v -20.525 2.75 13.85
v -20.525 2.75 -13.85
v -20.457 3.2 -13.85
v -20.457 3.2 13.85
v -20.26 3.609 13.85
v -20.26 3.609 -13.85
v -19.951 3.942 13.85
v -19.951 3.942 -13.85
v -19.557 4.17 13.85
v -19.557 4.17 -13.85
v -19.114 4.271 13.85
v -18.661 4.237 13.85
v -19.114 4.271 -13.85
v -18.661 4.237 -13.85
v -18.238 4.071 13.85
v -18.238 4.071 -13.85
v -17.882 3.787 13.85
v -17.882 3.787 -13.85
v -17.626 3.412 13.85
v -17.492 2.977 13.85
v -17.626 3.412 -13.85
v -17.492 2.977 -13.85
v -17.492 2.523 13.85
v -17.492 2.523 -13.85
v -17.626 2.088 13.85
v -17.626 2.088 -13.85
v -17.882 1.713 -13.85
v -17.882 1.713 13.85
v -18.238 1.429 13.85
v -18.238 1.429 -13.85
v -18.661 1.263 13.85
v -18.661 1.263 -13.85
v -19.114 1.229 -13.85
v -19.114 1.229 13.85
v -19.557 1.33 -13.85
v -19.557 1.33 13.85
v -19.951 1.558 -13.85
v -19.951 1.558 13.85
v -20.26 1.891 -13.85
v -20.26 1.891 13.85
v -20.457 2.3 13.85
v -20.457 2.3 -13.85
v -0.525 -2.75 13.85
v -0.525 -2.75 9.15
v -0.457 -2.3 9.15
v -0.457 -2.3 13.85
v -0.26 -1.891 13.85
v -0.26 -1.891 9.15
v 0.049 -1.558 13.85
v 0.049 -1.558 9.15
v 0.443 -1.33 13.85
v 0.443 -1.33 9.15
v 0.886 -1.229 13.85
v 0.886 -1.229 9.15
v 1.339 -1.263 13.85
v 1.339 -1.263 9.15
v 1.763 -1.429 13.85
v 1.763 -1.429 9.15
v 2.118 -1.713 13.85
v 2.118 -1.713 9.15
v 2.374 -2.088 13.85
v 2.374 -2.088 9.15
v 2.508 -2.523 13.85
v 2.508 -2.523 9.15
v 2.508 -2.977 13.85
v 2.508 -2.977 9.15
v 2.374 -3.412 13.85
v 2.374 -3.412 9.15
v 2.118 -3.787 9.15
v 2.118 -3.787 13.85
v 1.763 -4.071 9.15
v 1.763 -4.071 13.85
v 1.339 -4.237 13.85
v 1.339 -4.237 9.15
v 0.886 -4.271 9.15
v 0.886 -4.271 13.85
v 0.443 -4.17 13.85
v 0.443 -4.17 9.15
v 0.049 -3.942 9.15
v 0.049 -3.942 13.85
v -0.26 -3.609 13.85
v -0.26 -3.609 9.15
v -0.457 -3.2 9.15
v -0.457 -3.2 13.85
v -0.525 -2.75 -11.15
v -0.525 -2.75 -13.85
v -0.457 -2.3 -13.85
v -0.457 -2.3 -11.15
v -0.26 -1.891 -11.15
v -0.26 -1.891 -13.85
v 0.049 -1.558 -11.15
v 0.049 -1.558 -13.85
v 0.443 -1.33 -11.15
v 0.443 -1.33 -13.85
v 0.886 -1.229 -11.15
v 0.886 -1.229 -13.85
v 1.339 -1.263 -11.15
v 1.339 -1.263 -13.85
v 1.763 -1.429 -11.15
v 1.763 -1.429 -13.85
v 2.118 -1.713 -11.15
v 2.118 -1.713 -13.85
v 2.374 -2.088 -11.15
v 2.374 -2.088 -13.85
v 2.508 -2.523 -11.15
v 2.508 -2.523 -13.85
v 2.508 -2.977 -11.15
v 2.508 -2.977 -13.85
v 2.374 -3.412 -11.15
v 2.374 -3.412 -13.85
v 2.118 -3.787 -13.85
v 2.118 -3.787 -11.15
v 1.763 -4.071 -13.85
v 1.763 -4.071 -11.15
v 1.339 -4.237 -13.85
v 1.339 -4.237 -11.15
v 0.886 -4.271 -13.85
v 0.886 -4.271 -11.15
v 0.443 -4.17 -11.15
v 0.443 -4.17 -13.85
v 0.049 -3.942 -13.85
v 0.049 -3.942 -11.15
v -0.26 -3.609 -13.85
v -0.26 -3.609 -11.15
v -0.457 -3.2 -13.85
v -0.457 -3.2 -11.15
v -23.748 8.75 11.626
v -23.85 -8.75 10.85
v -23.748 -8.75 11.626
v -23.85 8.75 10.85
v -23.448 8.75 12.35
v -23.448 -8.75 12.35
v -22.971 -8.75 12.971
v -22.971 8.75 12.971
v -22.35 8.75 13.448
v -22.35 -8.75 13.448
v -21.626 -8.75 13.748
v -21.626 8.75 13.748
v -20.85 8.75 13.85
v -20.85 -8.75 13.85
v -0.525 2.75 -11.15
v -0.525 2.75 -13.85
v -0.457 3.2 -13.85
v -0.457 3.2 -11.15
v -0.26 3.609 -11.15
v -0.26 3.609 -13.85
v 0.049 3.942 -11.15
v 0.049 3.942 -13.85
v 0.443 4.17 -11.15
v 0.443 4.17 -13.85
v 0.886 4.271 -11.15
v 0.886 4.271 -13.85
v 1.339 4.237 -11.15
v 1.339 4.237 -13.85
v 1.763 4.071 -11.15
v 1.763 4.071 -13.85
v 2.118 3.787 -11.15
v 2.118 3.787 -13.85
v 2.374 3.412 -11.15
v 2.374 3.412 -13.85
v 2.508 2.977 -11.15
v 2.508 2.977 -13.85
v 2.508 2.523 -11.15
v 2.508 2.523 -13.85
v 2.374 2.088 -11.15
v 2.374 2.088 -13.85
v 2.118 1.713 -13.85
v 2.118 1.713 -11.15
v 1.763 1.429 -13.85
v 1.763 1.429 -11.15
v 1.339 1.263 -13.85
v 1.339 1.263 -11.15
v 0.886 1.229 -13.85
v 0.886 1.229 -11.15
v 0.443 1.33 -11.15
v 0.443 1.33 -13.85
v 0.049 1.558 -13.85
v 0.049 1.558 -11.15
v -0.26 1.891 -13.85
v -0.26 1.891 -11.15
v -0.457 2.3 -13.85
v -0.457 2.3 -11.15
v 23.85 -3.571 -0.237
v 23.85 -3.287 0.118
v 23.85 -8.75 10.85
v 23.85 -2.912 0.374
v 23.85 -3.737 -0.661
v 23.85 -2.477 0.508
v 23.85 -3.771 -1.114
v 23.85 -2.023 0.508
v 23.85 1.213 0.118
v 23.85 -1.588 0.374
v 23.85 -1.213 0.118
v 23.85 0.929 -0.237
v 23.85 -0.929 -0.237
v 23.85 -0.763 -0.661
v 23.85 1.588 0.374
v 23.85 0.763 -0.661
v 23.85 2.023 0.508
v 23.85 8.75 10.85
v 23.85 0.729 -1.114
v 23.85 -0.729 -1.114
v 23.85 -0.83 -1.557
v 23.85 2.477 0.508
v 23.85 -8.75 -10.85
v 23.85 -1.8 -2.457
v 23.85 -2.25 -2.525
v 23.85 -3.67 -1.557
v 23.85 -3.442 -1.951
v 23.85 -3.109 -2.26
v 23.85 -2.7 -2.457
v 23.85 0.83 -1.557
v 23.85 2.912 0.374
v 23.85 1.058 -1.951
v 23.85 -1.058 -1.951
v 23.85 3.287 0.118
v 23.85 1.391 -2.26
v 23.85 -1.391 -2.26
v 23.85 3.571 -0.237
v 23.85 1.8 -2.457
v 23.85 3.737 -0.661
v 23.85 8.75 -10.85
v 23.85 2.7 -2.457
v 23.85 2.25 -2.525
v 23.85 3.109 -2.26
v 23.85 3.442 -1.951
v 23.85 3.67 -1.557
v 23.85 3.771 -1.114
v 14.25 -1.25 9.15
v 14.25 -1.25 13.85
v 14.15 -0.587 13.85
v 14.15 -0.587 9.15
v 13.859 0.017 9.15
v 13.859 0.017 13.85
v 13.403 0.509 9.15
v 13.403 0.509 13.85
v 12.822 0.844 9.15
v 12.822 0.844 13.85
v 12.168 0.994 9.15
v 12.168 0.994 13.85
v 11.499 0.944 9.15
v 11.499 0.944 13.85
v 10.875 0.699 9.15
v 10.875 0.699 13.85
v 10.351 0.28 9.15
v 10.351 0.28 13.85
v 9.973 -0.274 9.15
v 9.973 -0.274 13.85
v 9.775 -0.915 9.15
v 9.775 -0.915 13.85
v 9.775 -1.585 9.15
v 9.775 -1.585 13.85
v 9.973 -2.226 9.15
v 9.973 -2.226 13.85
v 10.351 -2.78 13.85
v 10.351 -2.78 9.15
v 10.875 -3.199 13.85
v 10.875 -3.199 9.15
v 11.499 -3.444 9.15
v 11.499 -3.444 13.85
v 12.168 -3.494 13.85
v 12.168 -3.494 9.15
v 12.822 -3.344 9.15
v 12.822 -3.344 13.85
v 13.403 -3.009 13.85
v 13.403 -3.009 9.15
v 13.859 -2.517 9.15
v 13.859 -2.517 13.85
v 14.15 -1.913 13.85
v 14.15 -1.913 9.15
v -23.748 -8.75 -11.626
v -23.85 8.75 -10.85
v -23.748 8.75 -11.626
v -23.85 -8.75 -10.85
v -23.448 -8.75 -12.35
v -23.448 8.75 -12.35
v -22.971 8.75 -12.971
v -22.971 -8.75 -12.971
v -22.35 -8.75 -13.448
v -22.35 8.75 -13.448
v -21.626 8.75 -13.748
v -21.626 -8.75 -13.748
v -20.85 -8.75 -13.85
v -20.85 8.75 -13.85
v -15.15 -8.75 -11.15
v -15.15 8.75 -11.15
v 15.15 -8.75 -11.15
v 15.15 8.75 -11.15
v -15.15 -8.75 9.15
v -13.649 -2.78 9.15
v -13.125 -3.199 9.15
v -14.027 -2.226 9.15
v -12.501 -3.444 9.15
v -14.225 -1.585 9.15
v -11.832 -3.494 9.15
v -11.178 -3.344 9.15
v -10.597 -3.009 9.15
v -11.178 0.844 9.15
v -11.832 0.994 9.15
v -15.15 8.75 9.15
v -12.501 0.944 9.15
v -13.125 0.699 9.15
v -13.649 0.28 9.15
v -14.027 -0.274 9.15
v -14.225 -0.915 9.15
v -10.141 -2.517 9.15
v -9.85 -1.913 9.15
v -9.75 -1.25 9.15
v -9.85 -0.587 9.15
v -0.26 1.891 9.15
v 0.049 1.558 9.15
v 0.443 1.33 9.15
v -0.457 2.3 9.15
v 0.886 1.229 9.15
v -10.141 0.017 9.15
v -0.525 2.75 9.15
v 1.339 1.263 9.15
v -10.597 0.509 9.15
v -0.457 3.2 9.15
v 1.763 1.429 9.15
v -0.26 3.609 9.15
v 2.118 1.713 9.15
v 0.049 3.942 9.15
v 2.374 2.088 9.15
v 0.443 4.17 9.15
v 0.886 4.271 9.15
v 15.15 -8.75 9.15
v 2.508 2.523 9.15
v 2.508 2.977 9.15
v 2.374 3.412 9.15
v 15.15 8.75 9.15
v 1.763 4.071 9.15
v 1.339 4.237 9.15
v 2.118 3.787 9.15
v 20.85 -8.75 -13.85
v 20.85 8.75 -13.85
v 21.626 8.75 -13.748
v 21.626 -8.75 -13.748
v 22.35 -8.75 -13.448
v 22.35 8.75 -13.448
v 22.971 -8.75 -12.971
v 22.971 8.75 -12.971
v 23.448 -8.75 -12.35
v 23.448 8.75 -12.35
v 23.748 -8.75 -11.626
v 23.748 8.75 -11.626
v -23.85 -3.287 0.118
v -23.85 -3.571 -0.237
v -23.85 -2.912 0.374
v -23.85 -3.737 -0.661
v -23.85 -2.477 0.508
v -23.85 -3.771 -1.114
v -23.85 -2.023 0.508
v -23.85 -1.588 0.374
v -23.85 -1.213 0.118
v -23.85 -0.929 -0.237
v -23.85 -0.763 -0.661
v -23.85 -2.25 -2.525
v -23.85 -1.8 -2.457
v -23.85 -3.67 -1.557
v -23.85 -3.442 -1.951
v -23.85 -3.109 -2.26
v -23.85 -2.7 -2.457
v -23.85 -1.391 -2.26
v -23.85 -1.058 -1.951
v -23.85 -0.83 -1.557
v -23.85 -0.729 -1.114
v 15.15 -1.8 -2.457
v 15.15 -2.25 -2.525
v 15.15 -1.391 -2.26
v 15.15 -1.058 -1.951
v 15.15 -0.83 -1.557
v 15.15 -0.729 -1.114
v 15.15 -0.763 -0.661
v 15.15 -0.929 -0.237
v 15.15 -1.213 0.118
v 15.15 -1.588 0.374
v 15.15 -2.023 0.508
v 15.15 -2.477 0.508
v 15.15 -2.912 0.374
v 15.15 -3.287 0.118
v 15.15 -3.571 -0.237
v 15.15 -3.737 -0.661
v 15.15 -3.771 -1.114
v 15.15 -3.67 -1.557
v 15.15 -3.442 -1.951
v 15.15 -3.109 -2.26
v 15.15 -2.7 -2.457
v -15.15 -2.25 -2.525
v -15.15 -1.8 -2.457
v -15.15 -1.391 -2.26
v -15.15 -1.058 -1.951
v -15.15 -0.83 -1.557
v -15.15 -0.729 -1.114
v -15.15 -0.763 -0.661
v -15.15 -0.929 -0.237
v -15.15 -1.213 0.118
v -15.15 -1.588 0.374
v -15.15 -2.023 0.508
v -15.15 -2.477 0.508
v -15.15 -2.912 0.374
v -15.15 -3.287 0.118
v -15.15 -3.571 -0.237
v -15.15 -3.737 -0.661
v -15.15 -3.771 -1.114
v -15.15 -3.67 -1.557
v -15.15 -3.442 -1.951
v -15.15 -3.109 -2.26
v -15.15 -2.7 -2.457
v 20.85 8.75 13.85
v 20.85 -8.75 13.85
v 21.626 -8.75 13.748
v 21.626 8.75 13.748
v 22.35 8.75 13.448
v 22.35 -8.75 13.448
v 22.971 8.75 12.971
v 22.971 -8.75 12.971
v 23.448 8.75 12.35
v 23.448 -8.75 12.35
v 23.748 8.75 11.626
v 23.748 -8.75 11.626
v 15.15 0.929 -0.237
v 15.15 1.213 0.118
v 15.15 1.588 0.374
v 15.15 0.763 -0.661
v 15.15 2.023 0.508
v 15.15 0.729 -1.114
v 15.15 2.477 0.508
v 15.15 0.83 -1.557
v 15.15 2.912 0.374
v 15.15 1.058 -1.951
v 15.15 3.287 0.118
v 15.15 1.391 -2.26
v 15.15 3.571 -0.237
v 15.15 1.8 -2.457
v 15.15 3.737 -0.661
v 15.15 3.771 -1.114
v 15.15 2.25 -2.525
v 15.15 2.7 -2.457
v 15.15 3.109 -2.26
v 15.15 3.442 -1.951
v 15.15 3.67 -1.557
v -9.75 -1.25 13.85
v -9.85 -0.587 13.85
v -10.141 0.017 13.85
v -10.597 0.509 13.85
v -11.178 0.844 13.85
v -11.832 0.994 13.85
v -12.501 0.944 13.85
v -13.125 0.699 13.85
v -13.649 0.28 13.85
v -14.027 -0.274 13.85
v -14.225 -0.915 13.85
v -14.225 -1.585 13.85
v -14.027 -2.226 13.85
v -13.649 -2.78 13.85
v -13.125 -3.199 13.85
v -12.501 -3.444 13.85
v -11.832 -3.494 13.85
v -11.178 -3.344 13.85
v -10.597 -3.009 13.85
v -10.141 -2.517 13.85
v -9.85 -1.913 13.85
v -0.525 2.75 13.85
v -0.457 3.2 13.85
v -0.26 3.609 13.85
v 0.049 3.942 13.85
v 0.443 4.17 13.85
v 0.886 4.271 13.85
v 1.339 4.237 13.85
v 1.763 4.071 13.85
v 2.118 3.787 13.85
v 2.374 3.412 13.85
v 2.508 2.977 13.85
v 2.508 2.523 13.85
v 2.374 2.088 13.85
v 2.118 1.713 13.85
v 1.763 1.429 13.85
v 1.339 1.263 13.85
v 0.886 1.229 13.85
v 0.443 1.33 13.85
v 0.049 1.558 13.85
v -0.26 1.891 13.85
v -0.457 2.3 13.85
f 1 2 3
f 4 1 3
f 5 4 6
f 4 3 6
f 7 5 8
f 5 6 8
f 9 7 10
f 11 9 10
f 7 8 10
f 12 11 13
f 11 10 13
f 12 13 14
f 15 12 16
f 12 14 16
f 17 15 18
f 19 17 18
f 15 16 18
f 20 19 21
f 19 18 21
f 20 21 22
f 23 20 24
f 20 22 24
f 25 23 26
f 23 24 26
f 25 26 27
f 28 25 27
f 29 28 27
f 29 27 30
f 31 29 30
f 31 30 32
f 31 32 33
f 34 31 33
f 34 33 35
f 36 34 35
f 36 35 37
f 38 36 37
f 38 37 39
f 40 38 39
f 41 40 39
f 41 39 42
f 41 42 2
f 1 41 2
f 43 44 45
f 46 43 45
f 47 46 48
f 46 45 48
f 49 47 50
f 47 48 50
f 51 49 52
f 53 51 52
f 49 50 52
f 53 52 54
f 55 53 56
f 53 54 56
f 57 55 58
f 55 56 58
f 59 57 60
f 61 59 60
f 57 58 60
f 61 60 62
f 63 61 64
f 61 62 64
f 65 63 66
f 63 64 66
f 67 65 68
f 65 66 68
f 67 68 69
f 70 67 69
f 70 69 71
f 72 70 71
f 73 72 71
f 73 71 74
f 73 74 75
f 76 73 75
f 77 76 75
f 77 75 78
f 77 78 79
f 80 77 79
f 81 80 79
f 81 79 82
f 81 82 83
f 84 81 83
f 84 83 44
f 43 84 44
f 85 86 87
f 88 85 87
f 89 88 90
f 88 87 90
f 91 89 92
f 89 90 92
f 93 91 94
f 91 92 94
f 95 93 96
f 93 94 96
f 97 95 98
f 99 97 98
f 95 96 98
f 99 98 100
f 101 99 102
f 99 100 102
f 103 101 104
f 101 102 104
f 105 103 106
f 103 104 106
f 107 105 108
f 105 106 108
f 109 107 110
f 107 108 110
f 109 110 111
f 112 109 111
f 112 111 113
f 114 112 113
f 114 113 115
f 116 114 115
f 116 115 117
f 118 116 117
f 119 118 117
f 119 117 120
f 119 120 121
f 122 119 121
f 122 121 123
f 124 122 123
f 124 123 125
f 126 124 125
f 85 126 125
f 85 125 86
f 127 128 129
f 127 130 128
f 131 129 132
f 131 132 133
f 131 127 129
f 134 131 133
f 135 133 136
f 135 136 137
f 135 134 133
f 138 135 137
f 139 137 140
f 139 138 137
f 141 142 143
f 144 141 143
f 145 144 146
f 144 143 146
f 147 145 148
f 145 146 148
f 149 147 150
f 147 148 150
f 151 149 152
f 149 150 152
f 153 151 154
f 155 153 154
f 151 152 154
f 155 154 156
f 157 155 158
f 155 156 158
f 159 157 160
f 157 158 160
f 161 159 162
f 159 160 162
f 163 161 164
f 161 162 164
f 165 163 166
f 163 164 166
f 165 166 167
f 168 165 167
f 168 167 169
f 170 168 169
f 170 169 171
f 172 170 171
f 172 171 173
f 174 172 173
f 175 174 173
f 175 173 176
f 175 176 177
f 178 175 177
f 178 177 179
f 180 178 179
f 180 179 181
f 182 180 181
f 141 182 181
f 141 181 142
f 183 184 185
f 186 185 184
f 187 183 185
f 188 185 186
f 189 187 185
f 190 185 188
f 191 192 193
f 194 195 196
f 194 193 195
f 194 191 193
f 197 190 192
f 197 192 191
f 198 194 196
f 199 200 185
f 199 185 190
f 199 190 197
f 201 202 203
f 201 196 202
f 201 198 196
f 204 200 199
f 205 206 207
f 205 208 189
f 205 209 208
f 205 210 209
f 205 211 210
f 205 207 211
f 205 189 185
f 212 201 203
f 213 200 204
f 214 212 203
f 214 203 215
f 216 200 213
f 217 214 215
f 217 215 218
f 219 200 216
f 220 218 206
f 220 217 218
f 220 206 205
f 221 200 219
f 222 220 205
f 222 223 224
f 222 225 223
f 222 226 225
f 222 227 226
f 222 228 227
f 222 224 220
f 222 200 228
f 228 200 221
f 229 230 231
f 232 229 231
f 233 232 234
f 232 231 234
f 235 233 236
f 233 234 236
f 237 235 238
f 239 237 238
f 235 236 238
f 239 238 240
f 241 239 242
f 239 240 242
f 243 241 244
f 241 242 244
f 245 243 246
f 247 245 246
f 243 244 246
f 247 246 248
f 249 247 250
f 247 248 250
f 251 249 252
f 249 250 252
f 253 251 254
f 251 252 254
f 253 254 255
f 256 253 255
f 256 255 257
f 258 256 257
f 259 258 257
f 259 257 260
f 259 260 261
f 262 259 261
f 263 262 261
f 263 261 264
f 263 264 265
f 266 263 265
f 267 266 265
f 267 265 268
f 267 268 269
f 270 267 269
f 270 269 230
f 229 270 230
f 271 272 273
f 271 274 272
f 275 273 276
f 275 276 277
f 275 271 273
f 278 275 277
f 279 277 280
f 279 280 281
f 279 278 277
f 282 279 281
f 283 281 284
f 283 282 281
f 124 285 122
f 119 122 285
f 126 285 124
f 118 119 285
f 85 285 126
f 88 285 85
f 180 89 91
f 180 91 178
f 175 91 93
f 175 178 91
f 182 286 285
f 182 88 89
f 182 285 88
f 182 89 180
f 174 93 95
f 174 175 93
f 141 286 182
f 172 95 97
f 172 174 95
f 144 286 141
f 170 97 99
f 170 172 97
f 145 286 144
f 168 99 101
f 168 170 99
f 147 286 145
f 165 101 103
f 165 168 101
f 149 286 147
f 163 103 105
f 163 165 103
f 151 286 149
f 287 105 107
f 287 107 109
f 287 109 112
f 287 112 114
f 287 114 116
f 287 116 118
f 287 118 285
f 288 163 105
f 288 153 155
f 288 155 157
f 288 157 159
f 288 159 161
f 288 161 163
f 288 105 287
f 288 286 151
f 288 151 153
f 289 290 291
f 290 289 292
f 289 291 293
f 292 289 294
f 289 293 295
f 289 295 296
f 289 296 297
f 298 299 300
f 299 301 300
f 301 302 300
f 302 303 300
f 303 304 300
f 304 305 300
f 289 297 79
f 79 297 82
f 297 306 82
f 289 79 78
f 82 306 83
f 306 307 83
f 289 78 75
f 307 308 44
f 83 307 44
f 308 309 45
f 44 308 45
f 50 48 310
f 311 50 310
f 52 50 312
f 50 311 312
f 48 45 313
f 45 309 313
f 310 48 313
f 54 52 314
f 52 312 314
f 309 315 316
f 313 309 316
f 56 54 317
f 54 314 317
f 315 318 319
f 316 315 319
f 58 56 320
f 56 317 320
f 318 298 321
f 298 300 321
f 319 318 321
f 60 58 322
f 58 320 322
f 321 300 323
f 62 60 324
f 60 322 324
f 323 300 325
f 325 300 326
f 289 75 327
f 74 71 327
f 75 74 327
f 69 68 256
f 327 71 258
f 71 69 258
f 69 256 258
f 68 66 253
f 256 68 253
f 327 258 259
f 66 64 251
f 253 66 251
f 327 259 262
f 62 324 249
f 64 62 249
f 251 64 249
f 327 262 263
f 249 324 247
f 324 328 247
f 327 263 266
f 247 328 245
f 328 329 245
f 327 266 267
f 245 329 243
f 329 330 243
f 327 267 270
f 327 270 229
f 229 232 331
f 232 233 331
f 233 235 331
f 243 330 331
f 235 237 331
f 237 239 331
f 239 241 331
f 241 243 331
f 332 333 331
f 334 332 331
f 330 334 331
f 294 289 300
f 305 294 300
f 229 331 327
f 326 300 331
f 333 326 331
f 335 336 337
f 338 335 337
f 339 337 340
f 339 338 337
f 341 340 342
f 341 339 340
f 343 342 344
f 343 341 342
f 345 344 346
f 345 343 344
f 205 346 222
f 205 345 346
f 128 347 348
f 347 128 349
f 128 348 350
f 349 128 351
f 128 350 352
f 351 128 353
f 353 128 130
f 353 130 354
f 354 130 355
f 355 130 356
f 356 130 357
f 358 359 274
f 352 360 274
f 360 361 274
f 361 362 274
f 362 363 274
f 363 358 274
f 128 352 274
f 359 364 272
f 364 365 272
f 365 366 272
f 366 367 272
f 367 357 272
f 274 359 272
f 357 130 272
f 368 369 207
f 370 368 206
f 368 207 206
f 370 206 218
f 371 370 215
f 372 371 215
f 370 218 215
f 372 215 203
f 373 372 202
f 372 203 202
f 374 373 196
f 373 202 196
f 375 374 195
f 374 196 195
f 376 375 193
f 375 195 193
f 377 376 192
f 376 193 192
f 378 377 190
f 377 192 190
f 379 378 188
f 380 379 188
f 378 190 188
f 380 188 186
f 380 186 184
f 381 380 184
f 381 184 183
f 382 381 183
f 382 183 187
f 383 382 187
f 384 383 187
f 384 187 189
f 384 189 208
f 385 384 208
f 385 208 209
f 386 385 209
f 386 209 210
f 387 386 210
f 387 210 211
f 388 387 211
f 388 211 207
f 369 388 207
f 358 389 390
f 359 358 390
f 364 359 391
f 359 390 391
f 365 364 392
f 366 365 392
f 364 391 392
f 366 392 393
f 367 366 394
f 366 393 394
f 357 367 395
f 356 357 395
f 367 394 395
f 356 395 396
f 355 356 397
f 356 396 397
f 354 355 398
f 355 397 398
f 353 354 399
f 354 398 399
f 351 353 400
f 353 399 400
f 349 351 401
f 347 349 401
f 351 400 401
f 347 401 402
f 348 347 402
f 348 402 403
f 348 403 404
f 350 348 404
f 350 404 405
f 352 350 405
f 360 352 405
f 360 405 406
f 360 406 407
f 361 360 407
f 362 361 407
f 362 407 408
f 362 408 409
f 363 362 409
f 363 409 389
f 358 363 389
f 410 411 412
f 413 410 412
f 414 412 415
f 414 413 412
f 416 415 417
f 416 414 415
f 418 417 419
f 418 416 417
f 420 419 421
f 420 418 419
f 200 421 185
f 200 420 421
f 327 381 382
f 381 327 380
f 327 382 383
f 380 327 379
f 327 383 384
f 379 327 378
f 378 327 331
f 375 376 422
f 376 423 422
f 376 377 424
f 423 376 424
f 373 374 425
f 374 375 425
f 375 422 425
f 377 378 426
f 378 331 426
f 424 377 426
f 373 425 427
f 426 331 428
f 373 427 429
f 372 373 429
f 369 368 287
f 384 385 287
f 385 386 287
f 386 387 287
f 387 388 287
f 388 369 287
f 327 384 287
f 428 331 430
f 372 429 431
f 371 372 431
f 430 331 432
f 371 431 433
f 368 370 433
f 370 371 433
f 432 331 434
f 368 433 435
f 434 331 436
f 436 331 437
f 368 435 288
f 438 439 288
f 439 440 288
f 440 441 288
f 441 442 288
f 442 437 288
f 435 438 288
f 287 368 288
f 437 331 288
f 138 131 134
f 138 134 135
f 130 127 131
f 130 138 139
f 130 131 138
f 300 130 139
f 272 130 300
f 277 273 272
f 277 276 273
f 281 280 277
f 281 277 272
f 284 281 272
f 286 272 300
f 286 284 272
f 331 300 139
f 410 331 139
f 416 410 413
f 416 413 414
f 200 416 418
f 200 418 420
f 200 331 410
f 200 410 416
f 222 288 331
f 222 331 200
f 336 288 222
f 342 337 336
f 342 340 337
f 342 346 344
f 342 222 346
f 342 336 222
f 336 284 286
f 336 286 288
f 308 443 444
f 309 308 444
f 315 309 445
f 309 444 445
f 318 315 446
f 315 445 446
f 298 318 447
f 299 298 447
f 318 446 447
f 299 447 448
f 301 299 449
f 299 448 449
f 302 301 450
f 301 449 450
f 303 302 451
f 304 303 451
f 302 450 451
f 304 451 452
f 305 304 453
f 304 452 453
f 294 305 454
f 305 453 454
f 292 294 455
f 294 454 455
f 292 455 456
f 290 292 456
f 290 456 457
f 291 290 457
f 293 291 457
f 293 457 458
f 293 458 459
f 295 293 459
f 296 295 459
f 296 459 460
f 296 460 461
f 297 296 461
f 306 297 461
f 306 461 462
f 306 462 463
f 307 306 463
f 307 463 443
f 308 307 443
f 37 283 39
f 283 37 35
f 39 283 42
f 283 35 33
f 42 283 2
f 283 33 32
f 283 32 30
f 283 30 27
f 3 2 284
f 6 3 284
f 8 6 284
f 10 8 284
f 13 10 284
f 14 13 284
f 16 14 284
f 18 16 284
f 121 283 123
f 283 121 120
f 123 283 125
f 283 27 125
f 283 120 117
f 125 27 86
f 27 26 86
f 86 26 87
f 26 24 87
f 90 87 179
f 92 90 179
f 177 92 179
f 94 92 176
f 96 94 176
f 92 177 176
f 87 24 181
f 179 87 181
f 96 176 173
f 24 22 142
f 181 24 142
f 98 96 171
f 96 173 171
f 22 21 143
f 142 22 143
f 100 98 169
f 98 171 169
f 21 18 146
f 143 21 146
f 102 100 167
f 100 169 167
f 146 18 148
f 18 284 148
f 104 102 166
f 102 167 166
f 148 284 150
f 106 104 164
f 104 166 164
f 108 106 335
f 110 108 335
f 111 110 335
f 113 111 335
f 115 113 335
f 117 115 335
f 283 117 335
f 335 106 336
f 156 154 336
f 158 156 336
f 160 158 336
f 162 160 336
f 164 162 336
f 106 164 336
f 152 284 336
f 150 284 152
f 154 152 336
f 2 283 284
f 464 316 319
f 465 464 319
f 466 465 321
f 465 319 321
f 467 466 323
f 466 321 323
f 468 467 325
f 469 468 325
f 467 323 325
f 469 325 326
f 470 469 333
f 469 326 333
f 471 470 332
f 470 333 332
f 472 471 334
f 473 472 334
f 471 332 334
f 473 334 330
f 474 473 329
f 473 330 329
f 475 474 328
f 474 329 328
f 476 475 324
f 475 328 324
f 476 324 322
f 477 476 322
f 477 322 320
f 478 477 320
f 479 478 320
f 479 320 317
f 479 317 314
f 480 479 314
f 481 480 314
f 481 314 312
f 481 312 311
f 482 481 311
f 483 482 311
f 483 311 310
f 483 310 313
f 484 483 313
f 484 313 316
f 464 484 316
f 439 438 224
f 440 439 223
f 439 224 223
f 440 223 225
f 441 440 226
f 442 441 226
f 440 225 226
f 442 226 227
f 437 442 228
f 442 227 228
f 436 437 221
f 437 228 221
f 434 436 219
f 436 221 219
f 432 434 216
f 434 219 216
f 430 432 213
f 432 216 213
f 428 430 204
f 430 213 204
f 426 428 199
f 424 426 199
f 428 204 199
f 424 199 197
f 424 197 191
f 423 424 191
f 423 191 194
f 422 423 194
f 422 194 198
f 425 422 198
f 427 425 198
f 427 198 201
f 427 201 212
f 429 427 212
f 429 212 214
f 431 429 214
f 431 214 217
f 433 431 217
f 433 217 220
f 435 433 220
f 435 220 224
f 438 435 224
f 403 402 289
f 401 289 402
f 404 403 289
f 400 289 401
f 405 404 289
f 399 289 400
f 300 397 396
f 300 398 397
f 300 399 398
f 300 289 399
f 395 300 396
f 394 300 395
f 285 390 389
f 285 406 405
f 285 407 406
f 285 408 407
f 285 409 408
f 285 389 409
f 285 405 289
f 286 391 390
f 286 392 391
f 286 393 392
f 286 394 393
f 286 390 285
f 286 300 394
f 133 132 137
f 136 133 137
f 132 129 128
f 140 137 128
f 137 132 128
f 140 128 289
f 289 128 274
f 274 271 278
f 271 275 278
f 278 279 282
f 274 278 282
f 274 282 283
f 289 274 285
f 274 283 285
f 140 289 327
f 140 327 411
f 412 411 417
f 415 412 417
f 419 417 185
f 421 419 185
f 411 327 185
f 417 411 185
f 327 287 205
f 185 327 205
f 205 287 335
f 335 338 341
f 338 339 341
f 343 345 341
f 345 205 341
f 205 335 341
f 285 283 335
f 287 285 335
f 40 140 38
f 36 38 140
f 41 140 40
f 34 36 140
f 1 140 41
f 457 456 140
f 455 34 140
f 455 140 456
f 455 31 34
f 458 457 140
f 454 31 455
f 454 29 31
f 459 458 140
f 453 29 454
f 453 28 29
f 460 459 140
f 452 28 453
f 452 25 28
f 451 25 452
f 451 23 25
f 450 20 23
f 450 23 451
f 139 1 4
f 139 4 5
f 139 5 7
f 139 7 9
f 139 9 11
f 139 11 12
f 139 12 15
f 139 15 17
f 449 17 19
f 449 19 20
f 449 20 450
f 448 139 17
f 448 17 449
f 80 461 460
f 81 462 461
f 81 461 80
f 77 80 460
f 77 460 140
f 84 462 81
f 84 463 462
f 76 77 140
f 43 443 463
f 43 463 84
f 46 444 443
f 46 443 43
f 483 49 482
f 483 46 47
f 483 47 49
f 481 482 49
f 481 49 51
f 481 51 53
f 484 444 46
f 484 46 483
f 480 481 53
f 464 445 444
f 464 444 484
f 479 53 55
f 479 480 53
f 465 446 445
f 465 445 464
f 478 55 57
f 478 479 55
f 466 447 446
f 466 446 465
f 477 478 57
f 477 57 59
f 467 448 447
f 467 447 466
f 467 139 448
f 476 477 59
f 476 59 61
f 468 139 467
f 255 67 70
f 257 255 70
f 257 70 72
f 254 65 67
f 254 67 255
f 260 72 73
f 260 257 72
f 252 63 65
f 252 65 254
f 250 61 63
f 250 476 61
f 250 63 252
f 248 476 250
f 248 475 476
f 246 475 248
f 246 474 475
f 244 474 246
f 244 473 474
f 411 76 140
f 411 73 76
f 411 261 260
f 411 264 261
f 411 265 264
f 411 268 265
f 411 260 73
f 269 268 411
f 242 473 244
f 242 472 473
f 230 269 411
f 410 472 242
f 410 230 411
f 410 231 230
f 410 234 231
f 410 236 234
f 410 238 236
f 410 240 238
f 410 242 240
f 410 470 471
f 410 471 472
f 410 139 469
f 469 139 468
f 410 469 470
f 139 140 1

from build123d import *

# Parameters (mm, degrees)
SKETCH_1_W               = 47.7
SKETCH_1_H               = 27.7
SKETCH_1_W_2             = 30.3
SKETCH_1_H_2             = 20.3
EXTRUDE_1_DEPTH          = 8.75
SKETCH_2_R               = 1.525
CUT_EXTRUDE_1_DEPTH      = 28.7
SKETCH_3_R               = 1.525
CUT_EXTRUDE_2_DEPTH      = 48.7
SKETCH_4_R               = 1.525
CUT_EXTRUDE_3_DEPTH      = 28.7
SKETCH_5_R               = 2.25
CUT_EXTRUDE_4_DEPTH      = 5
SKETCH_7_R               = 1.525
CUT_EXTRUDE_6_DEPTH      = 1
CUT_EXTRUDE_6_DEPTH_BACK = 28.7
CUT_EXTRUDE_7_REACH      = 49.7
SKETCH_8_R               = 1.525
FILLET_2_R               = 3


with BuildPart() as part:
    # 草图1 → 凸台-拉伸1 (new body, symmetric)
    with BuildSketch(Plane(origin=(0, 0, 0), x_dir=(1, 0, 0), z_dir=(0, 1, 0))):
        Rectangle(SKETCH_1_W, SKETCH_1_H)
        with Locations((0, 1)):
            Rectangle(SKETCH_1_W_2, SKETCH_1_H_2, mode=Mode.SUBTRACT)
    extrude(amount=EXTRUDE_1_DEPTH, both=True)

    # 草图2 → 切除-拉伸1 (cut, through all)
    with BuildSketch(Plane(origin=(0, 0, -13.85), x_dir=(-1, 0, 0), z_dir=(0, 0, -1))):
        with Locations((-1, 2.75)):
            Circle(SKETCH_2_R)
    extrude(amount=-CUT_EXTRUDE_1_DEPTH, mode=Mode.SUBTRACT)

    # 草图3 → 切除-拉伸2 (cut, through all)
    with BuildSketch(Plane(origin=(23.85, 0, 0), x_dir=(0, 0, -1), z_dir=(1, 0, 0))):
        with Locations((1, -2.25)):
            Circle(SKETCH_3_R)
    extrude(amount=-CUT_EXTRUDE_2_DEPTH, mode=Mode.SUBTRACT)

    # 草图4 → 切除-拉伸3 (cut, through all)
    with BuildSketch(Plane(origin=(0, 0, -13.85), x_dir=(-1, 0, 0), z_dir=(0, 0, -1))):
        with Locations((19, 2.75)):
            Circle(SKETCH_4_R)
    extrude(amount=-CUT_EXTRUDE_3_DEPTH, mode=Mode.SUBTRACT)

    # 草图5 → 切除-拉伸4 (cut)
    with BuildSketch(Plane.XY.offset(13.85)):
        with Locations((-12, -1.25)):
            Circle(SKETCH_5_R)
        with Locations((12, -1.25)):
            Circle(SKETCH_5_R)
    extrude(amount=-CUT_EXTRUDE_4_DEPTH, mode=Mode.SUBTRACT)

    # 草图7 → 切除-拉伸6 (cut, two sides)
    with BuildSketch(Plane(origin=(0, 0, -13.85), x_dir=(-1, 0, 0), z_dir=(0, 0, -1))) as cut_extrude_6_sk:
        with Locations((-1, -2.75)):
            Circle(SKETCH_7_R)
    extrude(amount=CUT_EXTRUDE_6_DEPTH, mode=Mode.SUBTRACT)
    extrude(cut_extrude_6_sk.sketch, amount=-CUT_EXTRUDE_6_DEPTH_BACK, mode=Mode.SUBTRACT)

    # 草图8 → 切除-拉伸7 (cut, up to next)
    with BuildSketch(Plane(origin=(23.85, 0, 0), x_dir=(0, 0, -1), z_dir=(1, 0, 0)), mode=Mode.PRIVATE) as cut_extrude_7_sk1:
        with Locations((1, 2.25)):
            Circle(SKETCH_8_R)
    cut_extrude_7_tool1 = extrude(cut_extrude_7_sk1.sketch, amount=-CUT_EXTRUDE_7_REACH, mode=Mode.PRIVATE) & part.part
    add(cut_extrude_7_tool1.solids().sort_by_distance((23.85, 2.25, -1))[0], mode=Mode.SUBTRACT)

    # 圆角2
    fillet_2_edges = [part.edges().sort_by_distance(p)[0] for p in [
        (23.85, 0, 13.85),
        (-23.85, 0, 13.85),
        (-23.85, 0, -13.85),
        (23.85, 0, -13.85),
    ]]
    fillet(fillet_2_edges, radius=FILLET_2_R)


solid = part.part
